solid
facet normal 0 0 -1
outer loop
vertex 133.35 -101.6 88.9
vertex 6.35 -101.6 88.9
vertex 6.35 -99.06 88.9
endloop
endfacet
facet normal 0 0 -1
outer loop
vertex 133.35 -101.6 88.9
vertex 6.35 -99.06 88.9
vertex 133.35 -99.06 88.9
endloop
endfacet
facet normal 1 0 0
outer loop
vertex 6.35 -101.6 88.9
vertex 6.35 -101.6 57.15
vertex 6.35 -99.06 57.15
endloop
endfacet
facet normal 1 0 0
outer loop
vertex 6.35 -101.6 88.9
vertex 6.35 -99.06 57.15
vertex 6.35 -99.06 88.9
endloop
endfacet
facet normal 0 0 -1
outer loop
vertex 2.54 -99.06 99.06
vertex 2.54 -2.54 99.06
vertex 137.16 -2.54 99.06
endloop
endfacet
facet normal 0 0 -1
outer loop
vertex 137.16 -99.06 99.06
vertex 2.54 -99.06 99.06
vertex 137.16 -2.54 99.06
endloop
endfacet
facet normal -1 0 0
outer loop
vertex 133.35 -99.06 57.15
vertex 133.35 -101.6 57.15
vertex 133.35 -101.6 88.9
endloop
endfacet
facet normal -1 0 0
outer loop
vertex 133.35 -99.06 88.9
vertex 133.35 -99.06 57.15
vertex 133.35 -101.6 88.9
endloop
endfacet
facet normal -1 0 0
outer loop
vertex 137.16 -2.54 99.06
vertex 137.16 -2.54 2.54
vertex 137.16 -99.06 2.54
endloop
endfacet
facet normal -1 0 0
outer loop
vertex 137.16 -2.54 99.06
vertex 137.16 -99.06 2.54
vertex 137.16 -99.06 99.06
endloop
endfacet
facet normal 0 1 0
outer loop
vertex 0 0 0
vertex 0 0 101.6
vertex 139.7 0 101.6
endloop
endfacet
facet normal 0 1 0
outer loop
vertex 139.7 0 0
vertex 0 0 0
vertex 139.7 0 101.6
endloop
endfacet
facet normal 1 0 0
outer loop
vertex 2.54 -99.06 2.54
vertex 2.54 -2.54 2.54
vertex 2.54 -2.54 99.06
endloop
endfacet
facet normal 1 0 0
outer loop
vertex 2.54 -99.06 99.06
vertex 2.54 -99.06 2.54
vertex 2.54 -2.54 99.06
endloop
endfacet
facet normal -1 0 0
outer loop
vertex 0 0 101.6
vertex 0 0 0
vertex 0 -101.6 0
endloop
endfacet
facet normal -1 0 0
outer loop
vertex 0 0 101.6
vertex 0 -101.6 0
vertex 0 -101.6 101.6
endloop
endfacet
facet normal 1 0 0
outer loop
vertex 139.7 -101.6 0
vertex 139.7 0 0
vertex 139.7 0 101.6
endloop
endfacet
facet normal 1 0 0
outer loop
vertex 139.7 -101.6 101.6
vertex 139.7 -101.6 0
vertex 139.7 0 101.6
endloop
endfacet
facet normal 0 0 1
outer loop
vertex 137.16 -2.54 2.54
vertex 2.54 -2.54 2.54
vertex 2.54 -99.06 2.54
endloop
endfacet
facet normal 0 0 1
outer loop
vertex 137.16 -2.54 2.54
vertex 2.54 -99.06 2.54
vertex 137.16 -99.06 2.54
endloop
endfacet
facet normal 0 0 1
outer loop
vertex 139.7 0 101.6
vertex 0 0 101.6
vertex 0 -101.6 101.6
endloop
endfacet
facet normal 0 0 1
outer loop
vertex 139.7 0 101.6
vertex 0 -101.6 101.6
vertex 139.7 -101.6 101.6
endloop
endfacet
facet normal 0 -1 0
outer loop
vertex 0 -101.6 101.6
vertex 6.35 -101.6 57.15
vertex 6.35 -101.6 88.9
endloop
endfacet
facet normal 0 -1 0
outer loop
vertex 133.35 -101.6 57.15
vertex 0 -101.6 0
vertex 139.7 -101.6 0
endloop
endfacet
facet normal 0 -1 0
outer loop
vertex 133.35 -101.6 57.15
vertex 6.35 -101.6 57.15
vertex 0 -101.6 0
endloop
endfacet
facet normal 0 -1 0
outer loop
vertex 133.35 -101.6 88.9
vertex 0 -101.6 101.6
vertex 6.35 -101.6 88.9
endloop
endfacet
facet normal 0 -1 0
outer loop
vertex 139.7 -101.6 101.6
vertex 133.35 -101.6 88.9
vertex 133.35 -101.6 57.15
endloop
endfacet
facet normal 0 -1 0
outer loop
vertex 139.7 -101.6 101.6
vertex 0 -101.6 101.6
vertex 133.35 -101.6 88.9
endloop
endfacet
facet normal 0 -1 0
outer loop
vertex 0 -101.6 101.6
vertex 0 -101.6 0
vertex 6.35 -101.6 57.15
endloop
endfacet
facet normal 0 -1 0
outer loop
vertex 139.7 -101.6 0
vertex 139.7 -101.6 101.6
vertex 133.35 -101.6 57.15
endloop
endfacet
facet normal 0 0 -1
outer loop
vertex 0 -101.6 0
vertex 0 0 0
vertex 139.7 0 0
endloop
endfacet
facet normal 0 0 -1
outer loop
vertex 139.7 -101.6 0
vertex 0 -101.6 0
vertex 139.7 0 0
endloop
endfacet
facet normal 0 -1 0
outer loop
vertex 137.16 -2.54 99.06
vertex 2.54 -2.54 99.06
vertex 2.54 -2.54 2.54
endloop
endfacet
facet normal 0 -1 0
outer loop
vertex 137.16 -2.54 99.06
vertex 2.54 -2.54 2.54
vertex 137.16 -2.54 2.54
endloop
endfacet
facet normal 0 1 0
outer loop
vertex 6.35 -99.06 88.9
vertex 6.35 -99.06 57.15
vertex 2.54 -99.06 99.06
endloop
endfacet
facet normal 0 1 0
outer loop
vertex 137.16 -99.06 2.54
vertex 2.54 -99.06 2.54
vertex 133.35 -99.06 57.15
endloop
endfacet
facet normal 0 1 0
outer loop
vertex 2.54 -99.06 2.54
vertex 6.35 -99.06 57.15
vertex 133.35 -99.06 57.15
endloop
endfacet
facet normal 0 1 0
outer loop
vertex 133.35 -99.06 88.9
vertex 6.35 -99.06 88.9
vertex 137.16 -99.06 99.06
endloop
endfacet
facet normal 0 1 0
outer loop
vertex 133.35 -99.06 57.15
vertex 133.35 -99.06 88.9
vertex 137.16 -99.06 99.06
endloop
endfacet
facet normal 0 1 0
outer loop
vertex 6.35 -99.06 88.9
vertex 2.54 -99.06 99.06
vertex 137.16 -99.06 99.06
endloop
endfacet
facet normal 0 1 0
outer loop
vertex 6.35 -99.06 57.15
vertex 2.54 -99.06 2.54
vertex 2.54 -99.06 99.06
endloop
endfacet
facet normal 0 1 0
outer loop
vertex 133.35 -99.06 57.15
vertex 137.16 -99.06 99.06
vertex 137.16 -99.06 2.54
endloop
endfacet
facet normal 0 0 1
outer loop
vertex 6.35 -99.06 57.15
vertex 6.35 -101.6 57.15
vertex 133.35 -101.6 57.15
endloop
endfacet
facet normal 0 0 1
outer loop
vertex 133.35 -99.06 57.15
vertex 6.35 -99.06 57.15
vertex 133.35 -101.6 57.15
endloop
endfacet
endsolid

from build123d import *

# Parameters (mm, degrees)
F0_W     = 139.7
F0_H     = 101.6
F1_DEPTH = 101.6
F2_T     = -2.54
F3_W     = 127
F3_H     = 31.75
F4_DEPTH = 25.4


with BuildPart() as f1:
    # F0 (on Front) → F1 (new body)
    with BuildSketch(Plane.XZ):
        with Locations((69.85, 50.8)):
            Rectangle(F0_W, F0_H)
    extrude(amount=F1_DEPTH)

    # F2 (hollow: no face is removed)
    offset(amount=F2_T, mode=Mode.SUBTRACT)

    # F3 (on face) → F4 (cut)
    with BuildSketch(Plane.XZ.offset(101.6)):
        with Locations((69.85, 73.025)):
            Rectangle(F3_W, F3_H)
    extrude(amount=-F4_DEPTH, mode=Mode.SUBTRACT)


solid = f1.part
